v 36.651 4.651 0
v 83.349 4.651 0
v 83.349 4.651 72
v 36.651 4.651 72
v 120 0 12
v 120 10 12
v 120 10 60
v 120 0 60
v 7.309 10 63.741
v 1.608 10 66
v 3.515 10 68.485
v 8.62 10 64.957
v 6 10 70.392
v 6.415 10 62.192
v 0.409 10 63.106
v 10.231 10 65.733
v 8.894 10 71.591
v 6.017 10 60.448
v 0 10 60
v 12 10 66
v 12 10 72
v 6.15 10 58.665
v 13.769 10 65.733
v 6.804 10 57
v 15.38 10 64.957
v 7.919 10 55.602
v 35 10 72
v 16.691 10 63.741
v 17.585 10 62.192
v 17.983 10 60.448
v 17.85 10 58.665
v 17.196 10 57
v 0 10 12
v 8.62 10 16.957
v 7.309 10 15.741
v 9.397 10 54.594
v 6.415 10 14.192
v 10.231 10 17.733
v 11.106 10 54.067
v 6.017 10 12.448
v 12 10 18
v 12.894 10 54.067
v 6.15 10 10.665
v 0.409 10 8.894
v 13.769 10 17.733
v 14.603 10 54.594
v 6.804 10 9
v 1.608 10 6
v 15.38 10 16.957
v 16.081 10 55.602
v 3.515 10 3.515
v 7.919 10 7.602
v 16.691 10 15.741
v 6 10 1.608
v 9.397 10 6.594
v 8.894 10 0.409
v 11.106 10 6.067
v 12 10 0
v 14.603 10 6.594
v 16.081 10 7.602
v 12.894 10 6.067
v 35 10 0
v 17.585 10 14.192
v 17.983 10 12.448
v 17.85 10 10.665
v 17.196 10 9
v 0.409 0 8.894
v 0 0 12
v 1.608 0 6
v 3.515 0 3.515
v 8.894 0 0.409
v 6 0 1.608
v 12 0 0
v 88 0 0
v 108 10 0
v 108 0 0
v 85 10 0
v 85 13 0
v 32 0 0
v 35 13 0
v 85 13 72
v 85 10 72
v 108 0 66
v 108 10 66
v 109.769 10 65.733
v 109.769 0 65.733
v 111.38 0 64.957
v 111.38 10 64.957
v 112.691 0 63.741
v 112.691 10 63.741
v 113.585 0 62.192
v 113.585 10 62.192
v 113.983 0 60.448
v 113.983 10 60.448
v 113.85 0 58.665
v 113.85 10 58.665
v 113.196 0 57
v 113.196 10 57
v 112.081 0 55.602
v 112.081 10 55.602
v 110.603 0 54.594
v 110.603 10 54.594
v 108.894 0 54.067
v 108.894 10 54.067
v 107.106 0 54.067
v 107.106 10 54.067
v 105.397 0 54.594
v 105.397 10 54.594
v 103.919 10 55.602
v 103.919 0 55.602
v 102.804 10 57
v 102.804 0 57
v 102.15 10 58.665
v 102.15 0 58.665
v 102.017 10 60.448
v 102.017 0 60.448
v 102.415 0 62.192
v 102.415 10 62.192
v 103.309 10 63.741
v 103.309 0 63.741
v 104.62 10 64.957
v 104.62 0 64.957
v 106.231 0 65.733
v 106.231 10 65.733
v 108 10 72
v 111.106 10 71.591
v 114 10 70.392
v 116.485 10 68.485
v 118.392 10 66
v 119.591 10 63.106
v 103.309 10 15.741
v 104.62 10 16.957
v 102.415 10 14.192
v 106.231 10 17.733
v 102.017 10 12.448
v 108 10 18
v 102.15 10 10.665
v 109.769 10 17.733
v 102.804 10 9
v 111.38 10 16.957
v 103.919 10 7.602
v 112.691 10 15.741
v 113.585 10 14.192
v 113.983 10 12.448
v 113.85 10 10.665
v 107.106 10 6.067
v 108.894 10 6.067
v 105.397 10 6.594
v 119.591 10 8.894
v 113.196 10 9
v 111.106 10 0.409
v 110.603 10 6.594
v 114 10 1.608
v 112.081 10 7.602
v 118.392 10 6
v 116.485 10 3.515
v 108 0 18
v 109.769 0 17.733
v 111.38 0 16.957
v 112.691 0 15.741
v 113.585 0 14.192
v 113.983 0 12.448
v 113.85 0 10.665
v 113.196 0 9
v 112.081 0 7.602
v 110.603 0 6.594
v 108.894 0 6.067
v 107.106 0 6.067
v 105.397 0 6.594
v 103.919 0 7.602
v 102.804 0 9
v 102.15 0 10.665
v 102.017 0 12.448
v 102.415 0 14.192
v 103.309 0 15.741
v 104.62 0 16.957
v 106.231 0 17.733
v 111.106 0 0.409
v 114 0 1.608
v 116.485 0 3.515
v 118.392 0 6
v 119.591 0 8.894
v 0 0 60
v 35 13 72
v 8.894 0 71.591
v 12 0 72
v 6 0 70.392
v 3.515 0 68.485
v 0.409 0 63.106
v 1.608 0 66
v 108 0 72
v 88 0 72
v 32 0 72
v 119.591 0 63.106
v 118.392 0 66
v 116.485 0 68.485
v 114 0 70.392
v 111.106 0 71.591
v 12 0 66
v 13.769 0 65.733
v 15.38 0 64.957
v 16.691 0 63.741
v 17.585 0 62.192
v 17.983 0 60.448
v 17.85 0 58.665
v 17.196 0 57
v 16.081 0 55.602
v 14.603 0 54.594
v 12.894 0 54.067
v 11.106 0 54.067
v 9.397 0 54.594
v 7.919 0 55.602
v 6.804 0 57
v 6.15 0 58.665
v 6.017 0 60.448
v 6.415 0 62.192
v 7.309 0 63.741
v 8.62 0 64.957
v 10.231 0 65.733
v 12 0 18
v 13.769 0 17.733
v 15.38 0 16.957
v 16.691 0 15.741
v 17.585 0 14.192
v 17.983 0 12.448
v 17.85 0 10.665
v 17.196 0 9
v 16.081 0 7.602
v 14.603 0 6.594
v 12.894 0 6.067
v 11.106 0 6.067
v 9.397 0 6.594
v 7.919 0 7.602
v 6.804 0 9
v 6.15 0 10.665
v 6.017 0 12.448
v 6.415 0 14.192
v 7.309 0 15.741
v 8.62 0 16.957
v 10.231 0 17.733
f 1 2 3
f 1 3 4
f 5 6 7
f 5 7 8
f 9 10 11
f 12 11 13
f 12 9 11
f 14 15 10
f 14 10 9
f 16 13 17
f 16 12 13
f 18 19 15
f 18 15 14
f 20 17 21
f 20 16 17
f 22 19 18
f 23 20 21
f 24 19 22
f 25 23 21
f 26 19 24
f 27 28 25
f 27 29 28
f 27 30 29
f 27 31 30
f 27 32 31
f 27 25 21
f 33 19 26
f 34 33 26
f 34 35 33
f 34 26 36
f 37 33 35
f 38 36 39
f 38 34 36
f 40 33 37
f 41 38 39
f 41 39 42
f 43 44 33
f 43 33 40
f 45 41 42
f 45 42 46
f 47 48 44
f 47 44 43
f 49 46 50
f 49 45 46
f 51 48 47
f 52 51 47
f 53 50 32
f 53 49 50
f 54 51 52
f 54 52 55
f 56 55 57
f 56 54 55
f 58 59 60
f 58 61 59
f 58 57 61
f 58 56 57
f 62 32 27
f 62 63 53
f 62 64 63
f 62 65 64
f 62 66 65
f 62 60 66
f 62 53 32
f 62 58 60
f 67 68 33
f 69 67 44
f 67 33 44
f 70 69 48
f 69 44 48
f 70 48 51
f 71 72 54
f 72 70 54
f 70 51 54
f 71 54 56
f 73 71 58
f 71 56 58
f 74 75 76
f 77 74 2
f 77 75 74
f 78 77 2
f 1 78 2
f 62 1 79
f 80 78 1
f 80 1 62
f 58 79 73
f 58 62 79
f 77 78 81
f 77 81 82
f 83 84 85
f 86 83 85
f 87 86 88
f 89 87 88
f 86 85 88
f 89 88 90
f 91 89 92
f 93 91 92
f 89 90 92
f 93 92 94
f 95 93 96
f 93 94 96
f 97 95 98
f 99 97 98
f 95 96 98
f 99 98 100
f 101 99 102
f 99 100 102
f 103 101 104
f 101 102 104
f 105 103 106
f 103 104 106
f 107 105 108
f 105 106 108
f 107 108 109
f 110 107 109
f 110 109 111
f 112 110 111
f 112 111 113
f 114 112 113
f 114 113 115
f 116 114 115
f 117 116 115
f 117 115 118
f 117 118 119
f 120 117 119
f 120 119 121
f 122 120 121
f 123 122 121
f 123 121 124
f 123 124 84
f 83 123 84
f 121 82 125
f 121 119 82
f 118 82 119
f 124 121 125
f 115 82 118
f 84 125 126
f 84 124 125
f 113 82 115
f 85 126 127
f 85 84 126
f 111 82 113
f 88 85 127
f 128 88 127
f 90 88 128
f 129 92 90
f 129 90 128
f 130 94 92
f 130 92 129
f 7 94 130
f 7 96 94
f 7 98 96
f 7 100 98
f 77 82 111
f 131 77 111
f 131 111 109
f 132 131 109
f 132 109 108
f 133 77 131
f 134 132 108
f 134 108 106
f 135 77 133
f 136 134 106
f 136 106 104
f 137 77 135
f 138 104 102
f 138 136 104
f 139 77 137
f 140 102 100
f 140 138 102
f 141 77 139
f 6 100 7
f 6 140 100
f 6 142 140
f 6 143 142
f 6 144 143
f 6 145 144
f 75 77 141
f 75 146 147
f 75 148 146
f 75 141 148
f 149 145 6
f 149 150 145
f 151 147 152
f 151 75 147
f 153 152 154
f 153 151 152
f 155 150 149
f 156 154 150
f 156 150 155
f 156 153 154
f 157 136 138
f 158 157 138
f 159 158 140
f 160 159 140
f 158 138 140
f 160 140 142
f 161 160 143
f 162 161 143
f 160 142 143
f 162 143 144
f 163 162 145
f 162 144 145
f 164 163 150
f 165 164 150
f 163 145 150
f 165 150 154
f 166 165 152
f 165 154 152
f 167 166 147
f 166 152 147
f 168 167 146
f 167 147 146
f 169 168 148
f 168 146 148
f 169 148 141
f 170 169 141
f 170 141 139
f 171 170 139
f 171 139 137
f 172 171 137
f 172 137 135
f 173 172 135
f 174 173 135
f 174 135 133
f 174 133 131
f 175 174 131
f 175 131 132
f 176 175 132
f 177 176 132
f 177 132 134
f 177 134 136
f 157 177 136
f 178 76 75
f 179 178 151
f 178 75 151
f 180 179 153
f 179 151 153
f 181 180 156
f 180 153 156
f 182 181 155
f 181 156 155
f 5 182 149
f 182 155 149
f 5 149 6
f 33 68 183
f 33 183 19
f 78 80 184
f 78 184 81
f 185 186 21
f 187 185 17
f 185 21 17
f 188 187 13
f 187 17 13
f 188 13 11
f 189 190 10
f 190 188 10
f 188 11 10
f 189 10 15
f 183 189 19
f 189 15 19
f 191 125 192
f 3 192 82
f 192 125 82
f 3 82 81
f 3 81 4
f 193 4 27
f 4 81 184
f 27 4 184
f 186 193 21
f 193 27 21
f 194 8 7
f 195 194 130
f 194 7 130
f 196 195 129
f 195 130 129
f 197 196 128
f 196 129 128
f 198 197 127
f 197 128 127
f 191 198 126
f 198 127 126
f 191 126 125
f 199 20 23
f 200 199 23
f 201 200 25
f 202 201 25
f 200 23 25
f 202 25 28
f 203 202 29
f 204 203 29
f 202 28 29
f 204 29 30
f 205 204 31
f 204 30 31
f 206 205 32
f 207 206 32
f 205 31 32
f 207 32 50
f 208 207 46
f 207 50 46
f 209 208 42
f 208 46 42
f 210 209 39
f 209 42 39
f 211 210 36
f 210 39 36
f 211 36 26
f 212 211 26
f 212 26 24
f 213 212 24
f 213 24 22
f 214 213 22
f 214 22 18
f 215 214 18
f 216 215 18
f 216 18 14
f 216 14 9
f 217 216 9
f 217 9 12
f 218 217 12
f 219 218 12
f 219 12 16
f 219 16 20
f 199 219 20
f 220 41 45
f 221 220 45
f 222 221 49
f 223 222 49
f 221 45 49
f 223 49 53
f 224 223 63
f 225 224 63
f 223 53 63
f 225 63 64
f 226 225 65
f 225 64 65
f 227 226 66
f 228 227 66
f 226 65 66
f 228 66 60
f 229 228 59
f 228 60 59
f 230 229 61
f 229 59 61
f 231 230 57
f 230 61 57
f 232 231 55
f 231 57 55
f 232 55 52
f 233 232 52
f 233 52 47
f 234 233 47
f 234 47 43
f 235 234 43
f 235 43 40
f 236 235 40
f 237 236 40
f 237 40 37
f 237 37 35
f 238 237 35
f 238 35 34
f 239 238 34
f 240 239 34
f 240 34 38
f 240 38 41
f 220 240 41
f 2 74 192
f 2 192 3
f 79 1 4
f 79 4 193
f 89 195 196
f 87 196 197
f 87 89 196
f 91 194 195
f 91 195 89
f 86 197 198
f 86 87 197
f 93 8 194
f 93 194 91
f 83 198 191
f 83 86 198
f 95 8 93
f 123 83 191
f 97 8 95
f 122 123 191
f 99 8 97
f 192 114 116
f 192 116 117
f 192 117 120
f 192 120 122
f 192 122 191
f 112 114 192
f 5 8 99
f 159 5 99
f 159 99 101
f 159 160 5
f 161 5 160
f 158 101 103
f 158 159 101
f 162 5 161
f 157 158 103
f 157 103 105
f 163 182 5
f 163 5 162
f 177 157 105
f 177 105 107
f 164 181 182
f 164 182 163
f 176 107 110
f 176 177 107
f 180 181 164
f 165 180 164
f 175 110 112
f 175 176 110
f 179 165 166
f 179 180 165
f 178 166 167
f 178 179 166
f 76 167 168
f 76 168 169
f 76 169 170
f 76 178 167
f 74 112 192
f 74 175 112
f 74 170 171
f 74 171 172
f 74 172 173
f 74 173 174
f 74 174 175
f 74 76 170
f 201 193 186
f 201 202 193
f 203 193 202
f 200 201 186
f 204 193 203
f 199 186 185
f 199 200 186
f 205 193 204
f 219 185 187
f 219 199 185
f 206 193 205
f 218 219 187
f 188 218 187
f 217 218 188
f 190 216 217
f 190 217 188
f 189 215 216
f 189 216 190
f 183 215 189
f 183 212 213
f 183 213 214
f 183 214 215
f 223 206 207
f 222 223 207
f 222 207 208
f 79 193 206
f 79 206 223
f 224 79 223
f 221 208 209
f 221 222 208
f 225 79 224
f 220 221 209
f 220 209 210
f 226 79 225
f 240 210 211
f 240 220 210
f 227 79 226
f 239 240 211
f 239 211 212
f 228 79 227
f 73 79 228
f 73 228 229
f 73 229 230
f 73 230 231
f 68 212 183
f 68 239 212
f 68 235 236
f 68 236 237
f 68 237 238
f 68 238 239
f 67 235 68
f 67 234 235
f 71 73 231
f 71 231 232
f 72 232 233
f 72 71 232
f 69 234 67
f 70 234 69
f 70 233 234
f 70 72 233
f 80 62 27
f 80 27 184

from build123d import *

# Parameters (mm, degrees)
BOSS_EXTRUDE1_DEPTH = 72
SKETCH3_R           = 6
CUT_EXTRUDE1_DEPTH  = 72


with BuildPart() as part:
    # Sketch1 → Boss-Extrude1 (new body)
    with BuildSketch(Plane.XY):
        Polygon((0, 0), (0, 10), (35, 10), (35, 13), (85, 13), (85, 10), (120, 10), (120, 0), (88, 0), (83.349169446, 4.650830554), (36.650830554, 4.650830554), (32, 0), align=None)
    extrude(amount=BOSS_EXTRUDE1_DEPTH)

    # Sketch3 → Cut-Extrude1 (cut)
    with BuildSketch(Plane(origin=(0, 10, 0), x_dir=(1, 0, 0), z_dir=(0, 1, 0))):
        with Locations(Location((12, -12, 0), (0, 0, 270))):
            Circle(SKETCH3_R)
        with Locations(Location((108, -12, 0), (0, 0, 270))):
            Circle(SKETCH3_R)
        with Locations(Location((108, -60, 0), (0, 0, 270))):
            Circle(SKETCH3_R)
        with Locations(Location((12, -60, 0), (0, 0, 270))):
            Circle(SKETCH3_R)
        with BuildLine():
            ThreePointArc((0, -12), (3.514718626, -3.514718626), (12, 0))
            Line((12, 0), (0, 0))
            Line((0, 0), (0, -12))
        make_face()
        with BuildLine():
            ThreePointArc((12, -72), (3.514718626, -68.485281374), (0, -60))
            Line((0, -60), (0, -72))
            Line((0, -72), (12, -72))
        make_face()
        with BuildLine():
            Line((120, -72), (120, -60))
            ThreePointArc((120, -60), (116.485281374, -68.485281374), (108, -72))
            Line((108, -72), (120, -72))
        make_face()
        with BuildLine():
            Line((120, 0), (108, 0))
            ThreePointArc((108, 0), (116.485281374, -3.514718626), (120, -12))
            Line((120, -12), (120, 0))
        make_face()
    extrude(amount=-CUT_EXTRUDE1_DEPTH, mode=Mode.SUBTRACT)


solid = part.part
